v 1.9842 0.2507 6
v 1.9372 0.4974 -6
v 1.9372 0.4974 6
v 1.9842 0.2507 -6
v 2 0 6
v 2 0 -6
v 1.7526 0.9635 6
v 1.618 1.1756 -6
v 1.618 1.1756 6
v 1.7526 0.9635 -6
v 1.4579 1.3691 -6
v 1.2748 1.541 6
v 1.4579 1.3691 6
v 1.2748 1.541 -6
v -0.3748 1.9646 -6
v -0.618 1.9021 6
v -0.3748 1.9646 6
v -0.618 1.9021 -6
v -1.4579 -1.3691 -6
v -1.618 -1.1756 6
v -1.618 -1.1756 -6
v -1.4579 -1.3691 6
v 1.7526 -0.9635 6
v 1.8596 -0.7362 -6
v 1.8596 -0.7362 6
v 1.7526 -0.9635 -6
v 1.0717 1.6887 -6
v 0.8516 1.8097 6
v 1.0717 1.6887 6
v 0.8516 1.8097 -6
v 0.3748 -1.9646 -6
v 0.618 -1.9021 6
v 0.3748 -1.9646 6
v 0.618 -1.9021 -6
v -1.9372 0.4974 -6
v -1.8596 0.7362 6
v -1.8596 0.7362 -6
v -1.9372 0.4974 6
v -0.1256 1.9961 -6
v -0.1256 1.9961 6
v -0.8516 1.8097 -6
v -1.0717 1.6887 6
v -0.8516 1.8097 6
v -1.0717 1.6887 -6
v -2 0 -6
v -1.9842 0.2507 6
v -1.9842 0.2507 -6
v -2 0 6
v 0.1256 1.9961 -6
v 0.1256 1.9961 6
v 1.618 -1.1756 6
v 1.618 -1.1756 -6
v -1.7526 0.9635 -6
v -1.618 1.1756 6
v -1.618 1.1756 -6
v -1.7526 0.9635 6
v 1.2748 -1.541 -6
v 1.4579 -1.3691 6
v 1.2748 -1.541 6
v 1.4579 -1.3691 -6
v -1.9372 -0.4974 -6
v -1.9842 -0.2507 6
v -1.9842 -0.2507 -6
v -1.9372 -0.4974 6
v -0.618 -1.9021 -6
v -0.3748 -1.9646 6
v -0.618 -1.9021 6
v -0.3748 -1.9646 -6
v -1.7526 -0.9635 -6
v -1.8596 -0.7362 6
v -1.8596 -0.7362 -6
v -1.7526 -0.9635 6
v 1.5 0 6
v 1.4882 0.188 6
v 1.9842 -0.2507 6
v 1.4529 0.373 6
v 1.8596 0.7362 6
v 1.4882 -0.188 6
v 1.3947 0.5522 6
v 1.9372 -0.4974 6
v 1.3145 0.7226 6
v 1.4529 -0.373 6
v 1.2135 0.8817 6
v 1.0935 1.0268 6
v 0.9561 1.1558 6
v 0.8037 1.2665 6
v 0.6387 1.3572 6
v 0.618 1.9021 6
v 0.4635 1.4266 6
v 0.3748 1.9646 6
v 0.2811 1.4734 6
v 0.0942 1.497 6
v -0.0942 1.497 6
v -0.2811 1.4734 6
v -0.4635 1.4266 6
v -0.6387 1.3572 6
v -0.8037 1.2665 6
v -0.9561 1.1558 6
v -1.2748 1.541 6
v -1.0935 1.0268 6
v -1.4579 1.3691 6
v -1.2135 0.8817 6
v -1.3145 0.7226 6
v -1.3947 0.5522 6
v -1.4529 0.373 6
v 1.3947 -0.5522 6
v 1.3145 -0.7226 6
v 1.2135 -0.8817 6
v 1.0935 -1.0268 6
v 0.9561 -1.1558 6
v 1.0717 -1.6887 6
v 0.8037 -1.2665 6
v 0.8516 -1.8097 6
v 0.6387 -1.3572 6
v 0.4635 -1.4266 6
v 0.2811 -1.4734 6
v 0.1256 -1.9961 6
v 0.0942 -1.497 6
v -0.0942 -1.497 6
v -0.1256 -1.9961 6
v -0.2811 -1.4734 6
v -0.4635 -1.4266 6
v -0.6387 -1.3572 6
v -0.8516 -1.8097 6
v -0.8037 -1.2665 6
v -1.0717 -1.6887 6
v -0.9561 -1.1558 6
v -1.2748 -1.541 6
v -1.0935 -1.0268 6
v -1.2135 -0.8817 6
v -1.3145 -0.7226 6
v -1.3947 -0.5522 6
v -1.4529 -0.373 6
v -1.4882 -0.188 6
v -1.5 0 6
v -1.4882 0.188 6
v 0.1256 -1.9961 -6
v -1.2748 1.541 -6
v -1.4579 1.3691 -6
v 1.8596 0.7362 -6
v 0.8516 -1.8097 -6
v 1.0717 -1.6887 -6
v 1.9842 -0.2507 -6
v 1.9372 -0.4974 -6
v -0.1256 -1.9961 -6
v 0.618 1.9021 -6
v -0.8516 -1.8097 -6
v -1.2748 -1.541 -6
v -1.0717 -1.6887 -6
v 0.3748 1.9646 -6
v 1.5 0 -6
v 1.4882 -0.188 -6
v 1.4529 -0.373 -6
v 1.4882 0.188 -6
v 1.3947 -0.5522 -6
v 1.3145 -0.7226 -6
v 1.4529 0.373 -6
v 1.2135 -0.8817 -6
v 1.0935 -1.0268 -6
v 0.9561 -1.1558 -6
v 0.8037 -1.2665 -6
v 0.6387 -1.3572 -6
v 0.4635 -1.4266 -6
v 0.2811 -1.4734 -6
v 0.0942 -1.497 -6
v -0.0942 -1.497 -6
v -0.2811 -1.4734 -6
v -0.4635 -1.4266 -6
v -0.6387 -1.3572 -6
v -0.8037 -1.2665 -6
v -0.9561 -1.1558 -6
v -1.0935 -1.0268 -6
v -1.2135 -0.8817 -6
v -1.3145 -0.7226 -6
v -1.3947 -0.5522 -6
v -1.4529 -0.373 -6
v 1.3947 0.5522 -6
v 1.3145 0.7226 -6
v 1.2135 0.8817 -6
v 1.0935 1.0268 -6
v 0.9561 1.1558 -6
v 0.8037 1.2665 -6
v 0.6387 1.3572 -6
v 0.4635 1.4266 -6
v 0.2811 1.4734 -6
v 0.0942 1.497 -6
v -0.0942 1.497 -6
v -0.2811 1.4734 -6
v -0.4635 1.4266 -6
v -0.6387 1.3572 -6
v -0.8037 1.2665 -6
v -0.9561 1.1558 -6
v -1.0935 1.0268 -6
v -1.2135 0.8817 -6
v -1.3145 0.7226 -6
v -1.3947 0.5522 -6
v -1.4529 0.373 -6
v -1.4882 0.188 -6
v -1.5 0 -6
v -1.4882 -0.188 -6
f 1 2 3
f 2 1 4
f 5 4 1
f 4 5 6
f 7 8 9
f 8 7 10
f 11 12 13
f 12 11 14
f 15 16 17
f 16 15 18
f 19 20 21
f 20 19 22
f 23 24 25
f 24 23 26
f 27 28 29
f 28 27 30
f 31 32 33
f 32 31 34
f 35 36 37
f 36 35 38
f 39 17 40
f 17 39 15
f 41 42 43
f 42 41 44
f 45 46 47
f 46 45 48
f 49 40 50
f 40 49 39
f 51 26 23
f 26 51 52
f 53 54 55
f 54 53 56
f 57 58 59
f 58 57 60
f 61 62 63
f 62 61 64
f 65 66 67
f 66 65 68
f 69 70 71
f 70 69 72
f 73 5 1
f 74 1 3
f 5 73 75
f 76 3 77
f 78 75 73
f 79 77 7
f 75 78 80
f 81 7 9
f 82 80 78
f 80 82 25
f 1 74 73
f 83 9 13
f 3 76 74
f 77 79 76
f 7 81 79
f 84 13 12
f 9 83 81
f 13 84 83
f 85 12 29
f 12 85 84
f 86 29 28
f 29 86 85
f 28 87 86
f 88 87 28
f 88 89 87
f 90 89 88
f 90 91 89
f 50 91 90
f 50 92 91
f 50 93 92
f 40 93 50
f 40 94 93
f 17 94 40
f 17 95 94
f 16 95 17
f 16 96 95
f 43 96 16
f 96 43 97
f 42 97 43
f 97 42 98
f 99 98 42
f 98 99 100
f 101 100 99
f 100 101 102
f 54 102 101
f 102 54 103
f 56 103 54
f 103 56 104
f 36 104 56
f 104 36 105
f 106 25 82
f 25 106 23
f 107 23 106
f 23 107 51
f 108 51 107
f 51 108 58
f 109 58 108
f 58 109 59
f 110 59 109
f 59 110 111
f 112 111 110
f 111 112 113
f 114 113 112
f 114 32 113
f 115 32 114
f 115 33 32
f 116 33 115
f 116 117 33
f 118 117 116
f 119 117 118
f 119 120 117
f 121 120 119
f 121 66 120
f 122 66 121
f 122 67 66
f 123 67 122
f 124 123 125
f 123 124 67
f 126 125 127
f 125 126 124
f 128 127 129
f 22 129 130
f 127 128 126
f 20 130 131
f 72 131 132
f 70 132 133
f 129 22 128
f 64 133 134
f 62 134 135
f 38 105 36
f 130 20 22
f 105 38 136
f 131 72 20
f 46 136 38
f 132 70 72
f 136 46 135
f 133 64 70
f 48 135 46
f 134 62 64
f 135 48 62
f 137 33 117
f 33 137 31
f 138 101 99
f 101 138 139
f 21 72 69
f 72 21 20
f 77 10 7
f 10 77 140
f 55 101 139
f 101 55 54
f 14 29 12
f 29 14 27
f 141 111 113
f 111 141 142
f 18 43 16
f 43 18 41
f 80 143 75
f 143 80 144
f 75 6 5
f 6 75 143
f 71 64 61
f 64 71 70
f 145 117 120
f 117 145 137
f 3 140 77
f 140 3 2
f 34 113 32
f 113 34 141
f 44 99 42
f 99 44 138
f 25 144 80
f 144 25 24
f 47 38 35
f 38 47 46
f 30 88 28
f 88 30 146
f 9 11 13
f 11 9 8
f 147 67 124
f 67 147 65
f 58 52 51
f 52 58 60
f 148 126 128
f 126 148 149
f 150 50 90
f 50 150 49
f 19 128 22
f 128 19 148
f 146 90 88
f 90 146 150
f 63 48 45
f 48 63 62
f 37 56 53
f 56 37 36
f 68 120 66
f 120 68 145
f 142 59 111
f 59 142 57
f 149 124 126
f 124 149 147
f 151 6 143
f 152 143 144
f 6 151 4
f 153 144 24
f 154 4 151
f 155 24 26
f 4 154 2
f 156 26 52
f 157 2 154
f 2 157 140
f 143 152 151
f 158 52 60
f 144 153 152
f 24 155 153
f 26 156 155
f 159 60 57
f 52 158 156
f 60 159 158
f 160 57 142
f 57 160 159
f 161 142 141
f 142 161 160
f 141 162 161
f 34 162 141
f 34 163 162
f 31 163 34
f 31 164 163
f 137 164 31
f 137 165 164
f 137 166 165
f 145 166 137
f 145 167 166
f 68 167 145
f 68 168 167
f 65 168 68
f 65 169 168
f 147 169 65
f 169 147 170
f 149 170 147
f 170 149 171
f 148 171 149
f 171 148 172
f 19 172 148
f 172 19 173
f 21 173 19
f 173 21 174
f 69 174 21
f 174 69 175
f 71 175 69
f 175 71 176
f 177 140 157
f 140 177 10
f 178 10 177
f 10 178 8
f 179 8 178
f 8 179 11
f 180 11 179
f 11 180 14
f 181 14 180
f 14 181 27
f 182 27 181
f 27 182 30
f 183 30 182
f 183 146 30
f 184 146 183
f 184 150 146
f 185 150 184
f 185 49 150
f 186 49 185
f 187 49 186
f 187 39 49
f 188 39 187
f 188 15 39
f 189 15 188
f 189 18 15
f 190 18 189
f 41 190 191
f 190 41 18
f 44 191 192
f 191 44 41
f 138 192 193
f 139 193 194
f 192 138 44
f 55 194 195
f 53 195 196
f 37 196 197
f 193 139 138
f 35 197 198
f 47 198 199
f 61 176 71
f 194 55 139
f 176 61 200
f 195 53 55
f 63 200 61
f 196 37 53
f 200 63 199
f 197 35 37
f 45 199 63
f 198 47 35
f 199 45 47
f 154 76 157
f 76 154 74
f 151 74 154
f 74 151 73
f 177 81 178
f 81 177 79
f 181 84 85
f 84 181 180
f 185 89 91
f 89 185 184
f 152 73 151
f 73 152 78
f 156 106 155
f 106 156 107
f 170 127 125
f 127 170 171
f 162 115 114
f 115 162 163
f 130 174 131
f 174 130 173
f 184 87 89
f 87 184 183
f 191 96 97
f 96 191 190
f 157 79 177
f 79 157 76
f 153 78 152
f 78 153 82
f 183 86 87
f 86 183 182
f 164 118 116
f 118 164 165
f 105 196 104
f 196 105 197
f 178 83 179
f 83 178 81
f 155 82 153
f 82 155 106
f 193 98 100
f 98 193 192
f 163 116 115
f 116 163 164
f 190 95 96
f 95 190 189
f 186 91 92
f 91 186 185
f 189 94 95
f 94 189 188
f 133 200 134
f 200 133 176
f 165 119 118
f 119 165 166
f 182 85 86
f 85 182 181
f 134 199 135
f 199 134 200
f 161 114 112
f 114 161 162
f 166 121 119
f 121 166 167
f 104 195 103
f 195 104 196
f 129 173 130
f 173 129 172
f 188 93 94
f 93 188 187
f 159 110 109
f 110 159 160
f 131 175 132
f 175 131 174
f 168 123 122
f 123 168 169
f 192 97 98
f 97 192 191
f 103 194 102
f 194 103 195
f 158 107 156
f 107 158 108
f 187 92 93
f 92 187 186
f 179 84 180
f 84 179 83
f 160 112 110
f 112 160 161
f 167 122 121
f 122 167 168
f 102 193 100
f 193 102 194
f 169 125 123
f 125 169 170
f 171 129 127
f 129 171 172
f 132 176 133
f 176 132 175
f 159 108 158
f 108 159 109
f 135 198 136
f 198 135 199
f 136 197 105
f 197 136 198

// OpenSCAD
$fn = 50;


difference() {
	union() {
		translate(v = [0, 0, -6.0000000000]) {
			cylinder(h = 12, r = 2.0000000000);
		}
	}
	union() {
		translate(v = [0, 0, -100.0000000000]) {
			cylinder(h = 200, r = 1.5000000000);
		}
	}
}
